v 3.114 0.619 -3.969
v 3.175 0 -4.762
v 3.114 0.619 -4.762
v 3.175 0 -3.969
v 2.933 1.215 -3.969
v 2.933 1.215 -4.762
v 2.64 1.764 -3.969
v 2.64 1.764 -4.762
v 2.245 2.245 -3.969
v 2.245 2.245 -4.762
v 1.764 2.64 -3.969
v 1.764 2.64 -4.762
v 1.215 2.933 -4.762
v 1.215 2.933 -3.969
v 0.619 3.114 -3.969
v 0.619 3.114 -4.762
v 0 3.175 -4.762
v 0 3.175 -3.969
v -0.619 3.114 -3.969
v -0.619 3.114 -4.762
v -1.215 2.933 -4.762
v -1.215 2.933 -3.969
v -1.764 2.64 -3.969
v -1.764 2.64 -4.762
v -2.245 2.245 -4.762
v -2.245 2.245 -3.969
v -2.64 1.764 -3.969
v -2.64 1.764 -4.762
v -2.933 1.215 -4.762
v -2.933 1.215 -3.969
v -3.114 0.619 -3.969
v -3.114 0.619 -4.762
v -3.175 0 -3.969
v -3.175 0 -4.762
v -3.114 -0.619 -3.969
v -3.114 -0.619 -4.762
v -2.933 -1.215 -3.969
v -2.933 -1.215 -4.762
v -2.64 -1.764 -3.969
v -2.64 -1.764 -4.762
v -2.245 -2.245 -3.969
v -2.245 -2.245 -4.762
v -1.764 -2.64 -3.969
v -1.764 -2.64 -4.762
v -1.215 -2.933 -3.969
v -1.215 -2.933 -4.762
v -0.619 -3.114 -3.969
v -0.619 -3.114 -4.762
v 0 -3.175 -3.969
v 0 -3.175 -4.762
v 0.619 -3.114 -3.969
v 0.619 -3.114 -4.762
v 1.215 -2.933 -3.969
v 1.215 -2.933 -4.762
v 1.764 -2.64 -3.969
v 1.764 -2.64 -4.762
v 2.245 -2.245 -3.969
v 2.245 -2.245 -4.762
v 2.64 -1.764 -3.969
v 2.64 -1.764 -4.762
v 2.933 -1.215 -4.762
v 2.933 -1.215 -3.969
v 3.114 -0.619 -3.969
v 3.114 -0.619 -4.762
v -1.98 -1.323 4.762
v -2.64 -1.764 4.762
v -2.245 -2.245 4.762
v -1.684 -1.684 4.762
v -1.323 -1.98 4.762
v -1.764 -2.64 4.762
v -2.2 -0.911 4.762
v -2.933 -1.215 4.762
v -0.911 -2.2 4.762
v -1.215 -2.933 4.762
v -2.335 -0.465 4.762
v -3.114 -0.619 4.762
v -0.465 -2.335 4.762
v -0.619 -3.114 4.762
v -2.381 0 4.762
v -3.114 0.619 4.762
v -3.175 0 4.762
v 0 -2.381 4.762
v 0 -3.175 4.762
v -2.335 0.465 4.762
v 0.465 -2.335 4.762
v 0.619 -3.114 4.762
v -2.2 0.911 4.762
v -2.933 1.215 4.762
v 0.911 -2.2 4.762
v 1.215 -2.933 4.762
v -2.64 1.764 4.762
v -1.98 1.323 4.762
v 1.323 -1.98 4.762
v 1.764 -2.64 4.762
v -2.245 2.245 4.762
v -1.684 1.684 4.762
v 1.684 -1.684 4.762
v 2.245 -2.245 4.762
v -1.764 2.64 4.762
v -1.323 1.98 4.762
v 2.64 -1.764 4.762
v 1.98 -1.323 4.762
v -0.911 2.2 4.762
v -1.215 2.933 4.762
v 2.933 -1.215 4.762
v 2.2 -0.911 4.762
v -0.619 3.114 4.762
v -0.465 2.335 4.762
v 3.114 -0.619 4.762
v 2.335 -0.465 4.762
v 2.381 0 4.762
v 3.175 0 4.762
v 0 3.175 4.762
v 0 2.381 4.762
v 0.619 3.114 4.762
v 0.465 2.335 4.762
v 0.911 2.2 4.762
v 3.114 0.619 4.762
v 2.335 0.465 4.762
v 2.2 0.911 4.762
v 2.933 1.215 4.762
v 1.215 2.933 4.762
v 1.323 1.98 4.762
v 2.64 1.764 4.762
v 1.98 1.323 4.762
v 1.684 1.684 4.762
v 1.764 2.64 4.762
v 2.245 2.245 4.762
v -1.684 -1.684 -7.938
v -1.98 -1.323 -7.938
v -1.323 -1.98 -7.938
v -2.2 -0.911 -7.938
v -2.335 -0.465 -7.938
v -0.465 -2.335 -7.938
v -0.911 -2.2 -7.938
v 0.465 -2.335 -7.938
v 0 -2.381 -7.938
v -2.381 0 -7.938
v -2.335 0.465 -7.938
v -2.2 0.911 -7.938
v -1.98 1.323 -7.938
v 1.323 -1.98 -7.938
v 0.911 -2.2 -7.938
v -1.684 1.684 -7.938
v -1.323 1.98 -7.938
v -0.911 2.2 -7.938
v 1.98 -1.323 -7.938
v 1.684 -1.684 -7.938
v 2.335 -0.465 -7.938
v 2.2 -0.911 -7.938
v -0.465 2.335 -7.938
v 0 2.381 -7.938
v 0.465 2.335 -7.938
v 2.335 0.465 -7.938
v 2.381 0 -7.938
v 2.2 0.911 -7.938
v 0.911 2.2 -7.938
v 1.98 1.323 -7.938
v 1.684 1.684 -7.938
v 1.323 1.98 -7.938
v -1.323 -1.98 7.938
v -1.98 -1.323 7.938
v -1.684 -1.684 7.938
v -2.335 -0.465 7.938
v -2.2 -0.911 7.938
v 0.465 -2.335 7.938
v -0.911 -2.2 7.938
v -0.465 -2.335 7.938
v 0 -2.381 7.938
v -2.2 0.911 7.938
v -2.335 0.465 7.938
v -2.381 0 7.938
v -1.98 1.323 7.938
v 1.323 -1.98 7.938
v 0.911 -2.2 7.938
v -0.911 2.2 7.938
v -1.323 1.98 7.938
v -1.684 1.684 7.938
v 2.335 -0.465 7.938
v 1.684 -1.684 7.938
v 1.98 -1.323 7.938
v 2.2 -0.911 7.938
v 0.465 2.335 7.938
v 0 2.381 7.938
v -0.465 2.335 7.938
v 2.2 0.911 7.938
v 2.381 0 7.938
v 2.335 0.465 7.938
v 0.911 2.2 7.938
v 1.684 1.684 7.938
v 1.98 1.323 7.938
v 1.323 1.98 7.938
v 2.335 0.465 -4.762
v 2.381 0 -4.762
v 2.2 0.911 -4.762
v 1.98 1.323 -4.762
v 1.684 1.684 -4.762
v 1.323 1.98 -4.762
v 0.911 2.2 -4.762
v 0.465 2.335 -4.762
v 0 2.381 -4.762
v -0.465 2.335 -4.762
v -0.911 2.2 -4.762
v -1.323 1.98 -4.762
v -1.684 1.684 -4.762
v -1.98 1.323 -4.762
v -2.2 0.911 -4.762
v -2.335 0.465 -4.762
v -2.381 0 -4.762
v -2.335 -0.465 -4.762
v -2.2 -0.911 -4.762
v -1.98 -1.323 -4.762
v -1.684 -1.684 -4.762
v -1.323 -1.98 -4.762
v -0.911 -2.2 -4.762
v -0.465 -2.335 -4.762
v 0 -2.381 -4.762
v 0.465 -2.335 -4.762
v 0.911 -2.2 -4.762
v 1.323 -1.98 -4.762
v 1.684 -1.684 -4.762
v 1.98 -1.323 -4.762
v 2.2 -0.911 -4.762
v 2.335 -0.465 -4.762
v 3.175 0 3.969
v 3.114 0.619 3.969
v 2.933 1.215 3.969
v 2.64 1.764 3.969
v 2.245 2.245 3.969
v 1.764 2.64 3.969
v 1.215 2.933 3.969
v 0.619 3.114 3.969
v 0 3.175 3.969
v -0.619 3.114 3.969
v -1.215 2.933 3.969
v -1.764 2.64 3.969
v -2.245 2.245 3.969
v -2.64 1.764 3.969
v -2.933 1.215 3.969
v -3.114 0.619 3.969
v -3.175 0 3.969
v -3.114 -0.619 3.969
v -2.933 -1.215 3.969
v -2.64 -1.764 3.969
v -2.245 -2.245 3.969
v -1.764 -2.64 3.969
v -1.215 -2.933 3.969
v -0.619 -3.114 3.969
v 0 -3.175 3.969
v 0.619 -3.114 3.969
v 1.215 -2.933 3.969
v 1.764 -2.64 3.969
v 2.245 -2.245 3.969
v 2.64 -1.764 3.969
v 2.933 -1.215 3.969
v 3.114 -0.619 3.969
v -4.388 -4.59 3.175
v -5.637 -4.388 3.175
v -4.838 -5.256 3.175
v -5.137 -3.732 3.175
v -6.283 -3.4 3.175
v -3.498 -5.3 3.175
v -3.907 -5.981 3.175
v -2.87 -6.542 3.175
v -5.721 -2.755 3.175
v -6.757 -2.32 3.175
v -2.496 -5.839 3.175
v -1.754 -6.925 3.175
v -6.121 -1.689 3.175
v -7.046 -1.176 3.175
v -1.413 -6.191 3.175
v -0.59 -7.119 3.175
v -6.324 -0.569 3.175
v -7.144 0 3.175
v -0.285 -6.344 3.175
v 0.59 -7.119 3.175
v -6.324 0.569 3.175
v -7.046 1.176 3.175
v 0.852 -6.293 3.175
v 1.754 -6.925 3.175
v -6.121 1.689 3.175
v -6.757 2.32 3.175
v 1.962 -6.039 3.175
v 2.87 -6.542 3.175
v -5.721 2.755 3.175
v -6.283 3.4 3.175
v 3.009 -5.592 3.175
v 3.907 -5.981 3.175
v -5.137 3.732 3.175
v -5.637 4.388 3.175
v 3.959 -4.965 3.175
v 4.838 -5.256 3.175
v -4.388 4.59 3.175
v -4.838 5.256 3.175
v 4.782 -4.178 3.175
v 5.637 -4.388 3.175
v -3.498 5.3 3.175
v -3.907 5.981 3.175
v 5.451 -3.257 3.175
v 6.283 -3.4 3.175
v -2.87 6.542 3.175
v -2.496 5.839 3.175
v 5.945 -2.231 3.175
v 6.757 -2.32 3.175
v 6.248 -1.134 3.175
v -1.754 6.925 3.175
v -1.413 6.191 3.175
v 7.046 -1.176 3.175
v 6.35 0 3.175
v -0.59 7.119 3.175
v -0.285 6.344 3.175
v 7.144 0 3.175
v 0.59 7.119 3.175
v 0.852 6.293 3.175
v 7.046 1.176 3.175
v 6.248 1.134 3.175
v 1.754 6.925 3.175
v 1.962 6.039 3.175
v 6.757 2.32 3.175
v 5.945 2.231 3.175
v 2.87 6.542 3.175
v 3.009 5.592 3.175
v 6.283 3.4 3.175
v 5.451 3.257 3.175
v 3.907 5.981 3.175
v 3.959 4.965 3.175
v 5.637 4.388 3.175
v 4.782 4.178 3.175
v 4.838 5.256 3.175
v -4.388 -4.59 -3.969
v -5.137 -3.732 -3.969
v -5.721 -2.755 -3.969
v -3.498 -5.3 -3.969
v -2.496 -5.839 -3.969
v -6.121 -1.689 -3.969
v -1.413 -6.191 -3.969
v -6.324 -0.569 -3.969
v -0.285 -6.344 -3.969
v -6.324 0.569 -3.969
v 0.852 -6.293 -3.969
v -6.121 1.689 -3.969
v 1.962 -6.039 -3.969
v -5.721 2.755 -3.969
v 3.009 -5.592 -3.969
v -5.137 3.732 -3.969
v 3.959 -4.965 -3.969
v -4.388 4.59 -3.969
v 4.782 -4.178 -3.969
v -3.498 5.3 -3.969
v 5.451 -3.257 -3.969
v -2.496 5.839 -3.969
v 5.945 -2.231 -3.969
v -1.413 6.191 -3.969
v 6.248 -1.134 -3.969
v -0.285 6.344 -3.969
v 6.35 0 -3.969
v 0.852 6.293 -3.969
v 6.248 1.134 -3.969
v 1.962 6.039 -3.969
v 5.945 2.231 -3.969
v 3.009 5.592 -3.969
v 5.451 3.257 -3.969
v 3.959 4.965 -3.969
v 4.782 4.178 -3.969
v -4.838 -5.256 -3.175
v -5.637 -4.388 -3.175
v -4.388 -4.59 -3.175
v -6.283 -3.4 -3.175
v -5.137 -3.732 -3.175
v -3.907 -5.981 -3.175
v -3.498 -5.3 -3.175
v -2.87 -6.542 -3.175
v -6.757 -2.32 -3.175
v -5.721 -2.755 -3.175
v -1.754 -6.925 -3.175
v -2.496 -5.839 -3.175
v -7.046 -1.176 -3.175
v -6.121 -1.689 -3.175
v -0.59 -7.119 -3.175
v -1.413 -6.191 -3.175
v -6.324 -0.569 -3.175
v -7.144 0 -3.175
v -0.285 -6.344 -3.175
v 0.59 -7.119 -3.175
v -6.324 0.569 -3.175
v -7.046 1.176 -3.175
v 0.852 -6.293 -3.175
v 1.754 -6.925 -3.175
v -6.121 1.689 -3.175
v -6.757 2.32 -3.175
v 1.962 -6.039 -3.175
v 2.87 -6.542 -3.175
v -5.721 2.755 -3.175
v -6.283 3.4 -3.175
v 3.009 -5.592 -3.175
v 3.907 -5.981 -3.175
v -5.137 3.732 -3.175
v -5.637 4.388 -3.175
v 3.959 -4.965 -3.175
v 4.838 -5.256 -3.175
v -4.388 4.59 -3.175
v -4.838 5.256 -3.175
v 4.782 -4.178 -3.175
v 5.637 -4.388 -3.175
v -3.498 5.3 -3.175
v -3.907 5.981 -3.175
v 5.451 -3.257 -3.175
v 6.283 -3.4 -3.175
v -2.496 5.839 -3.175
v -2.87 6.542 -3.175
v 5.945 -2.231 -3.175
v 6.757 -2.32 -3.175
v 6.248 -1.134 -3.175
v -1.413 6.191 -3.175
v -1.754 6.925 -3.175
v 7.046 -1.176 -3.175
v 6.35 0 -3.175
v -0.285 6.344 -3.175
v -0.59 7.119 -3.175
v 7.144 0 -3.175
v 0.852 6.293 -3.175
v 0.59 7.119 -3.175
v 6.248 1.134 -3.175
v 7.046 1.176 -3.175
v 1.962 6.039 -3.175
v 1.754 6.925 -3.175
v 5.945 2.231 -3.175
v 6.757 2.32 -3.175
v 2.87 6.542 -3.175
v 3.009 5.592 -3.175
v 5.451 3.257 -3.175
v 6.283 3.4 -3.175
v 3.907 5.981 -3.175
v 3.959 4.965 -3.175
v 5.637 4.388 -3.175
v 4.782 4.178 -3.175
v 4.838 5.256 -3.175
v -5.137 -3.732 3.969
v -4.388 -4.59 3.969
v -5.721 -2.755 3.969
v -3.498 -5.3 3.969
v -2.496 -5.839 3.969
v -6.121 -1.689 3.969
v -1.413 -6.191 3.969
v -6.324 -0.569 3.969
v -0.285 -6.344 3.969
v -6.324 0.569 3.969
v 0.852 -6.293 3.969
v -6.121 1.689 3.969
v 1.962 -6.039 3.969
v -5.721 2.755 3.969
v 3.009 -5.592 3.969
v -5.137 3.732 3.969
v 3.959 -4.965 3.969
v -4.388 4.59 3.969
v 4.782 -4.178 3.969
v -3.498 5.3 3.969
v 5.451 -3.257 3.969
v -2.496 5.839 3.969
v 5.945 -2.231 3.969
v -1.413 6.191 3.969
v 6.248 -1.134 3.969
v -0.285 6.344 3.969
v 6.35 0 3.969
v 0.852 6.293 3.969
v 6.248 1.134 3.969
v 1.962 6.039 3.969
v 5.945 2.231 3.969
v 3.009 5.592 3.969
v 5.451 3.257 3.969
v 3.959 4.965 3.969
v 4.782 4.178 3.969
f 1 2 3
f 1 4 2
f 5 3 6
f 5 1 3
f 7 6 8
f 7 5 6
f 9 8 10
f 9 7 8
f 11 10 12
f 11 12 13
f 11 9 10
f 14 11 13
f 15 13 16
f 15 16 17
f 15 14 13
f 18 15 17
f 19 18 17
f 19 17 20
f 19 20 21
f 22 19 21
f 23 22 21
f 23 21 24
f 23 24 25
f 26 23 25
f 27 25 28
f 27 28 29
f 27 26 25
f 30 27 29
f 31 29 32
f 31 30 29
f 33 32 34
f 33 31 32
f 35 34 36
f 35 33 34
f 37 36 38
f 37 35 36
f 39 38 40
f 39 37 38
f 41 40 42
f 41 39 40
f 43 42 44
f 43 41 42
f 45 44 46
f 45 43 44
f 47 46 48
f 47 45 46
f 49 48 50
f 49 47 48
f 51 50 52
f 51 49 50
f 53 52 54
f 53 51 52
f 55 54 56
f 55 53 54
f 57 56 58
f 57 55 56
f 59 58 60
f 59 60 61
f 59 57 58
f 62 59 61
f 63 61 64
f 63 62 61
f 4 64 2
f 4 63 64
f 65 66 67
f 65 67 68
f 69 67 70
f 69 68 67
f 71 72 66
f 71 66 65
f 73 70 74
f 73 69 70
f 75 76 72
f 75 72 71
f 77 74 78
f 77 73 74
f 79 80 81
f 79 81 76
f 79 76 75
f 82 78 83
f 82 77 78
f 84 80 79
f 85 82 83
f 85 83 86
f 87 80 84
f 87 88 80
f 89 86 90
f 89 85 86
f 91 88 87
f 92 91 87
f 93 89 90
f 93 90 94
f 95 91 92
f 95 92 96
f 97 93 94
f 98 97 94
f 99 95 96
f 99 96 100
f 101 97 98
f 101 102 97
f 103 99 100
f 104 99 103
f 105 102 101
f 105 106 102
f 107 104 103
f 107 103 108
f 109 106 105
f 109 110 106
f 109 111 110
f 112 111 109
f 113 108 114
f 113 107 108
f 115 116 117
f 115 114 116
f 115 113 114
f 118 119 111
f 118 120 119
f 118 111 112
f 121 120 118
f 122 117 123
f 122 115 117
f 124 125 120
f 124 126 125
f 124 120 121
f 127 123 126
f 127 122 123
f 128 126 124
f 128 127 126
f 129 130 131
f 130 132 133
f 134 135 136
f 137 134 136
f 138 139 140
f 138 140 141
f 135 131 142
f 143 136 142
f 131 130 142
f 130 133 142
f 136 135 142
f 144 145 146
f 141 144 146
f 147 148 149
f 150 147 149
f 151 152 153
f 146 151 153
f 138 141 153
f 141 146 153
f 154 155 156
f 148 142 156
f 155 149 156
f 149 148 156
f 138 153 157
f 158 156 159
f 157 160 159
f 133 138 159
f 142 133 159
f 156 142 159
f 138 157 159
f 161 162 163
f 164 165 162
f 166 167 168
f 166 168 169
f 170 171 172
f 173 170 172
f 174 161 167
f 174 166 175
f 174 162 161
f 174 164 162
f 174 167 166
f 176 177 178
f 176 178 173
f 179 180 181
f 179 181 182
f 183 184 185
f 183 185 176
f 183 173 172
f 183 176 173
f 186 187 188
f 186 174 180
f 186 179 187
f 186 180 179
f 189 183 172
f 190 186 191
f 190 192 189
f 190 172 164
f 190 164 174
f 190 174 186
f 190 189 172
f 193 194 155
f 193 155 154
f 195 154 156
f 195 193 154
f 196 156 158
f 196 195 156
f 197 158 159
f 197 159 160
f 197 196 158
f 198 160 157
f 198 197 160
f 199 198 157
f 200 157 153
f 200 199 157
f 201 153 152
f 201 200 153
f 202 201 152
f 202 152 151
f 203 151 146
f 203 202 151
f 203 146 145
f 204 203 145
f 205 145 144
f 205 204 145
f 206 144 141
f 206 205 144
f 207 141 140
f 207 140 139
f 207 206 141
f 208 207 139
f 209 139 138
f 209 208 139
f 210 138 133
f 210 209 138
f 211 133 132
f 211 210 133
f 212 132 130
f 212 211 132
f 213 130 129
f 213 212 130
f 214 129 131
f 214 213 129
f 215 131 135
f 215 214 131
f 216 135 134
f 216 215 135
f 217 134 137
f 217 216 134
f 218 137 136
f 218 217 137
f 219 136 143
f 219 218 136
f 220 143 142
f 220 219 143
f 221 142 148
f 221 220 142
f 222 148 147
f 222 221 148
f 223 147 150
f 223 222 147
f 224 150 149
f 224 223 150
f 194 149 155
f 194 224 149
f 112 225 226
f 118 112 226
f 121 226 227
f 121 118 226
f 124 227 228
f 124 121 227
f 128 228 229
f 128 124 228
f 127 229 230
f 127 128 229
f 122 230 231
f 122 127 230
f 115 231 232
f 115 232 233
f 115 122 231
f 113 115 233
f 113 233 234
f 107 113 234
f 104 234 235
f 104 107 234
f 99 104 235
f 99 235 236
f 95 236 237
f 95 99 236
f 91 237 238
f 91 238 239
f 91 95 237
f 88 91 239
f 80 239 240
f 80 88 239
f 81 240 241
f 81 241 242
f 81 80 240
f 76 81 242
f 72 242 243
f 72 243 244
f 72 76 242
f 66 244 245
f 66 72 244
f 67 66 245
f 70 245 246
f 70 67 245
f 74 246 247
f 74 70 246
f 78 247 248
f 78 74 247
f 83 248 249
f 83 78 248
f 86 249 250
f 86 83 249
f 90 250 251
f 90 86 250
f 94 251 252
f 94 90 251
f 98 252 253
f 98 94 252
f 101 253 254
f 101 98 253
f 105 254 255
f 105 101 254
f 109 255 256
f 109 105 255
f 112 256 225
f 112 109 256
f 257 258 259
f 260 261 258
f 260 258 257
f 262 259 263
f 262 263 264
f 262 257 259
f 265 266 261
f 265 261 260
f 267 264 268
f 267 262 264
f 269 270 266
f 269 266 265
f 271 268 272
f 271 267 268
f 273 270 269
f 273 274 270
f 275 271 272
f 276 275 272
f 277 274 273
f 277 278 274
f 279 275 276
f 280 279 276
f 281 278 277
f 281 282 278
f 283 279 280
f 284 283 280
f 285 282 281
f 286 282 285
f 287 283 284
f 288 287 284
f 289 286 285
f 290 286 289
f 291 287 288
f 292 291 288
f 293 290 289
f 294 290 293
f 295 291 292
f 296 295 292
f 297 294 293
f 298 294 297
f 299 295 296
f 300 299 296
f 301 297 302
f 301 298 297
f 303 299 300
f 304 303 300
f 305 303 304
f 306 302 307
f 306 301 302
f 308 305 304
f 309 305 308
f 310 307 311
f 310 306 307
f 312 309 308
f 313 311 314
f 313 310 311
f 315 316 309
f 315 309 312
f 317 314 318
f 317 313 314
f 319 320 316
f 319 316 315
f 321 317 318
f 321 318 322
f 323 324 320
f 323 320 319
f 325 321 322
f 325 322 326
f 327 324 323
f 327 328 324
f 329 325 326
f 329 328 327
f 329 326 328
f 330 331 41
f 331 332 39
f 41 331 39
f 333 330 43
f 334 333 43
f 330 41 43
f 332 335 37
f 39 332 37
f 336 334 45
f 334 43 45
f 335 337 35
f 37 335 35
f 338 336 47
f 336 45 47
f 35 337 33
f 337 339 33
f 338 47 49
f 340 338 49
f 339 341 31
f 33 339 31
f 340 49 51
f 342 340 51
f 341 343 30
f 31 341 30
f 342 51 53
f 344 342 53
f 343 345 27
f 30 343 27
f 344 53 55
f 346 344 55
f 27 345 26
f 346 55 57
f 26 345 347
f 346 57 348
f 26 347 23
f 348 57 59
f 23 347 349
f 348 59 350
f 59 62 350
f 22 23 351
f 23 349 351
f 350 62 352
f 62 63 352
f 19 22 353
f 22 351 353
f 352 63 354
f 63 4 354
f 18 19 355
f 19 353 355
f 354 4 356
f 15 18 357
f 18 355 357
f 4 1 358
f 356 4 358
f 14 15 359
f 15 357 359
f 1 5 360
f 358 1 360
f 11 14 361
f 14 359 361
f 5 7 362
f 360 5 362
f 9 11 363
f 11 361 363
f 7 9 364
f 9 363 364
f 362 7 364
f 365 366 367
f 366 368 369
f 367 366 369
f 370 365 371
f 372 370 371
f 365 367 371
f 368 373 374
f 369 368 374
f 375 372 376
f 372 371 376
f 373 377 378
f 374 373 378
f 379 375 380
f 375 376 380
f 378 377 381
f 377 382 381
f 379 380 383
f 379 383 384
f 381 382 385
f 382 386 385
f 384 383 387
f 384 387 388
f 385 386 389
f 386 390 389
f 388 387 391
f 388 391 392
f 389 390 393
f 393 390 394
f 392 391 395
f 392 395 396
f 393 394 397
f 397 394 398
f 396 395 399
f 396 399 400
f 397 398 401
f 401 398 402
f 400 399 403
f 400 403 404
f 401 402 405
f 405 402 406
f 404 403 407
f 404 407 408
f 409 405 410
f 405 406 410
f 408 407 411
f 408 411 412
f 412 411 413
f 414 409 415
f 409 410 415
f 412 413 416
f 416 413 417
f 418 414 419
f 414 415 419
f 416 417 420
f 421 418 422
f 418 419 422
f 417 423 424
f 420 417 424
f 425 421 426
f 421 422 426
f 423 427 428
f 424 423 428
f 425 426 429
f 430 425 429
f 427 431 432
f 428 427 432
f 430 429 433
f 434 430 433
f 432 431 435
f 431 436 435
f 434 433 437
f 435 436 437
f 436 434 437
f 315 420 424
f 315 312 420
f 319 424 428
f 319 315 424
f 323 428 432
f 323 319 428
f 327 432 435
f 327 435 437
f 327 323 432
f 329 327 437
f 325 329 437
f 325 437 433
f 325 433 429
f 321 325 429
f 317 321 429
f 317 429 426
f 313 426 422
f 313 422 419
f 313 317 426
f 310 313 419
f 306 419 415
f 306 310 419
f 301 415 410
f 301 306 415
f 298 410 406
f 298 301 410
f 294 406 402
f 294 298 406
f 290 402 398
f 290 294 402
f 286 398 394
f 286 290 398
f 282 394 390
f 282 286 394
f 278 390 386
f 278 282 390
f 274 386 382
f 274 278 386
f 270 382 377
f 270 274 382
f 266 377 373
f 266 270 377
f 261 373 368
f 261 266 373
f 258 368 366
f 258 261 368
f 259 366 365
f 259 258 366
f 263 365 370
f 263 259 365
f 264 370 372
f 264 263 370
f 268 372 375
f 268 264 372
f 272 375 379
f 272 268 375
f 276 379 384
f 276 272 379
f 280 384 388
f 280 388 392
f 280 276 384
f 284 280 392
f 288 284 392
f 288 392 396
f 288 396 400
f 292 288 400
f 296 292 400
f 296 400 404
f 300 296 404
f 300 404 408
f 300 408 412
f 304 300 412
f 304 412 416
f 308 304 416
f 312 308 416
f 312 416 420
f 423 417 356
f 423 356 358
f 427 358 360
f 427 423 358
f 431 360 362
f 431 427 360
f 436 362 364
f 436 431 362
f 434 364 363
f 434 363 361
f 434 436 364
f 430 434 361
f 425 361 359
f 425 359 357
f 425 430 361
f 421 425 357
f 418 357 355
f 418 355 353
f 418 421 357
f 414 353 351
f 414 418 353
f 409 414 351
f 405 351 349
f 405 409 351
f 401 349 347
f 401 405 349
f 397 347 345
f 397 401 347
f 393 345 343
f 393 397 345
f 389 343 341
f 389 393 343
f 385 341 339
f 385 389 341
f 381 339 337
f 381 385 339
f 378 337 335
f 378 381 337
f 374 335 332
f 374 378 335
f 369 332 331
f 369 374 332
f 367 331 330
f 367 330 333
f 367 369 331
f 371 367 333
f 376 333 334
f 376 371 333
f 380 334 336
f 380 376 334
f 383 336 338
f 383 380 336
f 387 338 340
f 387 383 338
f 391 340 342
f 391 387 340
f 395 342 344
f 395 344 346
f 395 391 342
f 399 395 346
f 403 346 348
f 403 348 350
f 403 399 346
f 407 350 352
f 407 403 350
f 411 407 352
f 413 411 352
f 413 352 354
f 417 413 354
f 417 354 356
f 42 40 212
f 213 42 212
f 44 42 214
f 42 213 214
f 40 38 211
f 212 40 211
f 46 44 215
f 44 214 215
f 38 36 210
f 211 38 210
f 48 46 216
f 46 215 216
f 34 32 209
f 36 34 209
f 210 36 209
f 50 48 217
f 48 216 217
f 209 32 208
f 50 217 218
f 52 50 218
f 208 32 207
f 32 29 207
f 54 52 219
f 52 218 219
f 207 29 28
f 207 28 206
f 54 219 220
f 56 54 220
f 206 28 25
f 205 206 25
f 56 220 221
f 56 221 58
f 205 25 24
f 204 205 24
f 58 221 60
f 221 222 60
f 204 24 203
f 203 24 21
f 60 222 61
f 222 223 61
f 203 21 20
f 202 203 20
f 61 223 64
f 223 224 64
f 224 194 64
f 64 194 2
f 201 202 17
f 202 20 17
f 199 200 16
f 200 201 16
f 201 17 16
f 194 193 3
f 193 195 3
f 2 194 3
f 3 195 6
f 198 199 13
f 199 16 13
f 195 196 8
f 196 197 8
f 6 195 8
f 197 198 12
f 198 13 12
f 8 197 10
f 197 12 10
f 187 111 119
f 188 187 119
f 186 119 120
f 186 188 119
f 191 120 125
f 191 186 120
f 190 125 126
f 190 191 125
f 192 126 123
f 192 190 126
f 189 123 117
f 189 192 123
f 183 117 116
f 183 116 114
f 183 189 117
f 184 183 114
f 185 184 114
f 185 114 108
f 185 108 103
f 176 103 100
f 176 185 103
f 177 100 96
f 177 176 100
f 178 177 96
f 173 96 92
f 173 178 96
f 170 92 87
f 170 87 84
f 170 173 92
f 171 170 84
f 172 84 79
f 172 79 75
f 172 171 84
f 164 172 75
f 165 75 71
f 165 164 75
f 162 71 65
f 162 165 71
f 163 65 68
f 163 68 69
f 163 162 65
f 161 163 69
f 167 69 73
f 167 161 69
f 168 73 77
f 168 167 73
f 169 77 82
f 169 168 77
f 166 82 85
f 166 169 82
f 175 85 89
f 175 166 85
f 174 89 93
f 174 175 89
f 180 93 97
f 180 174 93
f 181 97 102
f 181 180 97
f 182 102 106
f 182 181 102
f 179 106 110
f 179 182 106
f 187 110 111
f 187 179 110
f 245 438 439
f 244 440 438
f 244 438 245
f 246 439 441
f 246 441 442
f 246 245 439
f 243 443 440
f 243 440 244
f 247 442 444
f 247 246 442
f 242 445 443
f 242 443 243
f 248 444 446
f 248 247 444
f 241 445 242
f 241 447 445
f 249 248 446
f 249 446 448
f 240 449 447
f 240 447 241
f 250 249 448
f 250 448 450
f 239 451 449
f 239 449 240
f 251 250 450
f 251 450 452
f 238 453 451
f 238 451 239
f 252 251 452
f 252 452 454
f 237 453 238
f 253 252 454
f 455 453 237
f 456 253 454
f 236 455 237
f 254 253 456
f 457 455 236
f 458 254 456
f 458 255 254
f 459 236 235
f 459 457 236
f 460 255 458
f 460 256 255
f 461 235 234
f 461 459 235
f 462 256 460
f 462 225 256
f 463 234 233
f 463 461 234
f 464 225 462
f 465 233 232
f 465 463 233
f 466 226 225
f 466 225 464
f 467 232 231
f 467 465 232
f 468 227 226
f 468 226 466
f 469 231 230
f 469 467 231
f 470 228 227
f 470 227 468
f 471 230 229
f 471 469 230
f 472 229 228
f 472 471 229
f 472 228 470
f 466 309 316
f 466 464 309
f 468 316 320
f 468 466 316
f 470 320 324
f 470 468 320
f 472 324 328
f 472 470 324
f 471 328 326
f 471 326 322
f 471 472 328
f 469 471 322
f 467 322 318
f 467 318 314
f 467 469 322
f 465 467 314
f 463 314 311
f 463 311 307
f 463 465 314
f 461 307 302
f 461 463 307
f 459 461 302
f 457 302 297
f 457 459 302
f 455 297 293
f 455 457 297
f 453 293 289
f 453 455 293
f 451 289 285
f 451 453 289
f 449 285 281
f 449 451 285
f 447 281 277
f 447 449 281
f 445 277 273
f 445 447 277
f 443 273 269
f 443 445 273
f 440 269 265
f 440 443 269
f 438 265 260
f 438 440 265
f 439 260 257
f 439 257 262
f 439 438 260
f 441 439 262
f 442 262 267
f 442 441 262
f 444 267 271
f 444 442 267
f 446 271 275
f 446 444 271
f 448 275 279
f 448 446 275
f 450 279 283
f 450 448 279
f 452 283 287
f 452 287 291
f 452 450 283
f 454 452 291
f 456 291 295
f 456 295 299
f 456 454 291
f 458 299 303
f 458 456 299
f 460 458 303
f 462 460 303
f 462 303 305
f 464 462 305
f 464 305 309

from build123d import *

# Parameters (mm, degrees)
F0_R     = 2.38125
F1_DEPTH = 7.9375
F2_R     = 3.175
F3_DEPTH = 4.7625
F4_R     = 7.14375
F5_DEPTH = 3.175
F6_R     = 6.35
F7_DEPTH = 3.96875


with BuildPart() as f1:
    # F0 (on Top) → F1 (new body, symmetric)
    with BuildSketch(Plane.XY):
        Circle(F0_R)
    extrude(amount=F1_DEPTH, both=True)

    # F2 (on Top) → F3 (join, symmetric)
    with BuildSketch(Plane.XY):
        Circle(F2_R)
    extrude(amount=F3_DEPTH, both=True)

    # F4 (on Top) → F5 (join, symmetric)
    with BuildSketch(Plane.XY):
        Circle(F4_R)
    extrude(amount=F5_DEPTH, both=True)

    # F6 (on Top) → F7 (join, symmetric)
    with BuildSketch(Plane.XY):
        Circle(F6_R)
    extrude(amount=F7_DEPTH, both=True)


solid = f1.part
